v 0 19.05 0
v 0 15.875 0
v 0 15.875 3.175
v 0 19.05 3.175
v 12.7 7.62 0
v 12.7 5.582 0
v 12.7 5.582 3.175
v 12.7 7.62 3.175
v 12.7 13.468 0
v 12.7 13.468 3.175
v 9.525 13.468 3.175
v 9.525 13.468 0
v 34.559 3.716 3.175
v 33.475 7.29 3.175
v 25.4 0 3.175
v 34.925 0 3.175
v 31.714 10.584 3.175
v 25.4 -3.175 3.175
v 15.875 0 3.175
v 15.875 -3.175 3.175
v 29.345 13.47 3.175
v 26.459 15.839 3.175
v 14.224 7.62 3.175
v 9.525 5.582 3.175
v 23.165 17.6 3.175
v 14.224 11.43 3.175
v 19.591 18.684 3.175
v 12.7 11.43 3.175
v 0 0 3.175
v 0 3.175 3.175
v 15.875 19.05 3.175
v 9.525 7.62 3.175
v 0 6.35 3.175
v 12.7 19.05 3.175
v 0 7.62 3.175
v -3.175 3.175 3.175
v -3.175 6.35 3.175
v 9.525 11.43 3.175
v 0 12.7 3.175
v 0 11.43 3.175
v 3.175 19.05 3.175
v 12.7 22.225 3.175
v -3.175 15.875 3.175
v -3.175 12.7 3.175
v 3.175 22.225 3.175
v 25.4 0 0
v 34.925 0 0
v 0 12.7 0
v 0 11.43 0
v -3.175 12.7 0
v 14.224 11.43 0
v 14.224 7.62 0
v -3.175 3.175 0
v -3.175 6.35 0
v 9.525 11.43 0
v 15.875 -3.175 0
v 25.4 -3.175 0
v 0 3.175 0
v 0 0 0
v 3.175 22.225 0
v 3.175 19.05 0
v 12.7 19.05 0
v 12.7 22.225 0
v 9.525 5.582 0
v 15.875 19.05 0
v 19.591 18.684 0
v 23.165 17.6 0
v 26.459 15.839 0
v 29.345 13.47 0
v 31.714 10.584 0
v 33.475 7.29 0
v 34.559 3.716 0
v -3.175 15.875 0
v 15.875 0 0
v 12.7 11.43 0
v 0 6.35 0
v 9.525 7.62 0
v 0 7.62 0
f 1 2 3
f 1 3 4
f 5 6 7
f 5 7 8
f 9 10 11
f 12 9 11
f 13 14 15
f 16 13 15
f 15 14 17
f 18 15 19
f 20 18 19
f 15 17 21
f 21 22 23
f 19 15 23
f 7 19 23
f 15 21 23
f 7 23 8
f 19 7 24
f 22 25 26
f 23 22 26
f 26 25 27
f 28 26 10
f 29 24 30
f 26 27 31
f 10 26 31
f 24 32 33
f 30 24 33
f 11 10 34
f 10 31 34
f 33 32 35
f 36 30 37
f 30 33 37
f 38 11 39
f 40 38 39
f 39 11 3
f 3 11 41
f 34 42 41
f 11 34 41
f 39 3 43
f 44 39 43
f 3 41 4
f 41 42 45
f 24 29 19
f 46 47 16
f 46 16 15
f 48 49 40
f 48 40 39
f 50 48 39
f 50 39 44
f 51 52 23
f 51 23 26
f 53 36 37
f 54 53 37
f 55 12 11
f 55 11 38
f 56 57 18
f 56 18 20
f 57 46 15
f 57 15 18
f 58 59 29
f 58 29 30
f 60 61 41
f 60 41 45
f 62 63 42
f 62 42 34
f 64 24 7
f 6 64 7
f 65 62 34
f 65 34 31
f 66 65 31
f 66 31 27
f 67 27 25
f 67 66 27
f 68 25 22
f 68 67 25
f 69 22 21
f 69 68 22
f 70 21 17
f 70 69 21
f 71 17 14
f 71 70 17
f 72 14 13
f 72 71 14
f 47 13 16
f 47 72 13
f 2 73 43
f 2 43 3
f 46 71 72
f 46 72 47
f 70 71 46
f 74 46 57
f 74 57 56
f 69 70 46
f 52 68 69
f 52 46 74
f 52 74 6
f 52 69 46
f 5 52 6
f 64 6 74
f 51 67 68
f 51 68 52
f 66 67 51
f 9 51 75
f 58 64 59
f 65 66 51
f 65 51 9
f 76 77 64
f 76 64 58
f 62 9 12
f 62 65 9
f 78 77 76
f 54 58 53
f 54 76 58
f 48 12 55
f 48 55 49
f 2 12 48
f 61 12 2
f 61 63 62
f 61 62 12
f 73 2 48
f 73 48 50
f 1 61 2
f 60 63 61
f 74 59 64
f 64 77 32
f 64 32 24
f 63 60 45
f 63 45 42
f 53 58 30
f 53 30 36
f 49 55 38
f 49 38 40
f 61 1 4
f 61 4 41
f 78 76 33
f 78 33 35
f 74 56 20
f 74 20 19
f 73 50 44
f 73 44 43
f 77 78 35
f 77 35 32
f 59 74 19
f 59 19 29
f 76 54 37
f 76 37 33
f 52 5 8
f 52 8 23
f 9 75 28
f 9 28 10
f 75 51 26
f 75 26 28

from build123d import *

# Parameters (mm, degrees)
BOSS_EXTRUDE1_DEPTH = 3.175


with BuildPart() as part:
    # Sketch1 → Boss-Extrude1 (new body)
    with BuildSketch(Plane.XY):
        with BuildLine():
            Line((0, 0), (0, 3.175))
            Line((0, 3.175), (-3.175, 3.175))
            Line((-3.175, 3.175), (-3.175, 6.35))
            Line((-3.175, 6.35), (0, 6.35))
            Line((0, 6.35), (0, 7.62))
            Line((0, 7.62), (9.525, 7.62))
            Line((9.525, 7.62), (9.525, 5.582477749))
            Line((9.525, 5.582477749), (12.7, 5.582477749))
            Line((12.7, 5.582477749), (12.7, 7.62))
            Line((12.7, 7.62), (14.224, 7.62))
            Line((14.224, 7.62), (14.224, 11.43))
            Line((14.224, 11.43), (12.7, 11.43))
            Line((12.7, 11.43), (12.7, 13.467522251))
            Line((12.7, 13.467522251), (9.525, 13.467522251))
            Line((9.525, 13.467522251), (9.525, 11.43))
            Line((9.525, 11.43), (0, 11.43))
            Line((0, 11.43), (0, 12.7))
            Line((0, 12.7), (-3.175, 12.7))
            Line((-3.175, 12.7), (-3.175, 15.875))
            Line((-3.175, 15.875), (0, 15.875))
            Line((0, 15.875), (0, 19.05))
            Line((0, 19.05), (3.175, 19.05))
            Line((3.175, 19.05), (3.175, 22.225))
            Line((3.175, 22.225), (12.7, 22.225))
            Line((12.7, 22.225), (12.7, 19.05))
            Line((12.7, 19.05), (15.875, 19.05))
            ThreePointArc((15.875, 19.05), (29.345384182, 13.470384182), (34.925, 0))
            Line((34.925, 0), (25.4, 0))
            Line((25.4, 0), (25.4, -3.175))
            Line((25.4, -3.175), (15.875, -3.175))
            Line((15.875, -3.175), (15.875, 0))
            Line((15.875, 0), (0, 0))
        make_face()
    extrude(amount=BOSS_EXTRUDE1_DEPTH)


solid = part.part
